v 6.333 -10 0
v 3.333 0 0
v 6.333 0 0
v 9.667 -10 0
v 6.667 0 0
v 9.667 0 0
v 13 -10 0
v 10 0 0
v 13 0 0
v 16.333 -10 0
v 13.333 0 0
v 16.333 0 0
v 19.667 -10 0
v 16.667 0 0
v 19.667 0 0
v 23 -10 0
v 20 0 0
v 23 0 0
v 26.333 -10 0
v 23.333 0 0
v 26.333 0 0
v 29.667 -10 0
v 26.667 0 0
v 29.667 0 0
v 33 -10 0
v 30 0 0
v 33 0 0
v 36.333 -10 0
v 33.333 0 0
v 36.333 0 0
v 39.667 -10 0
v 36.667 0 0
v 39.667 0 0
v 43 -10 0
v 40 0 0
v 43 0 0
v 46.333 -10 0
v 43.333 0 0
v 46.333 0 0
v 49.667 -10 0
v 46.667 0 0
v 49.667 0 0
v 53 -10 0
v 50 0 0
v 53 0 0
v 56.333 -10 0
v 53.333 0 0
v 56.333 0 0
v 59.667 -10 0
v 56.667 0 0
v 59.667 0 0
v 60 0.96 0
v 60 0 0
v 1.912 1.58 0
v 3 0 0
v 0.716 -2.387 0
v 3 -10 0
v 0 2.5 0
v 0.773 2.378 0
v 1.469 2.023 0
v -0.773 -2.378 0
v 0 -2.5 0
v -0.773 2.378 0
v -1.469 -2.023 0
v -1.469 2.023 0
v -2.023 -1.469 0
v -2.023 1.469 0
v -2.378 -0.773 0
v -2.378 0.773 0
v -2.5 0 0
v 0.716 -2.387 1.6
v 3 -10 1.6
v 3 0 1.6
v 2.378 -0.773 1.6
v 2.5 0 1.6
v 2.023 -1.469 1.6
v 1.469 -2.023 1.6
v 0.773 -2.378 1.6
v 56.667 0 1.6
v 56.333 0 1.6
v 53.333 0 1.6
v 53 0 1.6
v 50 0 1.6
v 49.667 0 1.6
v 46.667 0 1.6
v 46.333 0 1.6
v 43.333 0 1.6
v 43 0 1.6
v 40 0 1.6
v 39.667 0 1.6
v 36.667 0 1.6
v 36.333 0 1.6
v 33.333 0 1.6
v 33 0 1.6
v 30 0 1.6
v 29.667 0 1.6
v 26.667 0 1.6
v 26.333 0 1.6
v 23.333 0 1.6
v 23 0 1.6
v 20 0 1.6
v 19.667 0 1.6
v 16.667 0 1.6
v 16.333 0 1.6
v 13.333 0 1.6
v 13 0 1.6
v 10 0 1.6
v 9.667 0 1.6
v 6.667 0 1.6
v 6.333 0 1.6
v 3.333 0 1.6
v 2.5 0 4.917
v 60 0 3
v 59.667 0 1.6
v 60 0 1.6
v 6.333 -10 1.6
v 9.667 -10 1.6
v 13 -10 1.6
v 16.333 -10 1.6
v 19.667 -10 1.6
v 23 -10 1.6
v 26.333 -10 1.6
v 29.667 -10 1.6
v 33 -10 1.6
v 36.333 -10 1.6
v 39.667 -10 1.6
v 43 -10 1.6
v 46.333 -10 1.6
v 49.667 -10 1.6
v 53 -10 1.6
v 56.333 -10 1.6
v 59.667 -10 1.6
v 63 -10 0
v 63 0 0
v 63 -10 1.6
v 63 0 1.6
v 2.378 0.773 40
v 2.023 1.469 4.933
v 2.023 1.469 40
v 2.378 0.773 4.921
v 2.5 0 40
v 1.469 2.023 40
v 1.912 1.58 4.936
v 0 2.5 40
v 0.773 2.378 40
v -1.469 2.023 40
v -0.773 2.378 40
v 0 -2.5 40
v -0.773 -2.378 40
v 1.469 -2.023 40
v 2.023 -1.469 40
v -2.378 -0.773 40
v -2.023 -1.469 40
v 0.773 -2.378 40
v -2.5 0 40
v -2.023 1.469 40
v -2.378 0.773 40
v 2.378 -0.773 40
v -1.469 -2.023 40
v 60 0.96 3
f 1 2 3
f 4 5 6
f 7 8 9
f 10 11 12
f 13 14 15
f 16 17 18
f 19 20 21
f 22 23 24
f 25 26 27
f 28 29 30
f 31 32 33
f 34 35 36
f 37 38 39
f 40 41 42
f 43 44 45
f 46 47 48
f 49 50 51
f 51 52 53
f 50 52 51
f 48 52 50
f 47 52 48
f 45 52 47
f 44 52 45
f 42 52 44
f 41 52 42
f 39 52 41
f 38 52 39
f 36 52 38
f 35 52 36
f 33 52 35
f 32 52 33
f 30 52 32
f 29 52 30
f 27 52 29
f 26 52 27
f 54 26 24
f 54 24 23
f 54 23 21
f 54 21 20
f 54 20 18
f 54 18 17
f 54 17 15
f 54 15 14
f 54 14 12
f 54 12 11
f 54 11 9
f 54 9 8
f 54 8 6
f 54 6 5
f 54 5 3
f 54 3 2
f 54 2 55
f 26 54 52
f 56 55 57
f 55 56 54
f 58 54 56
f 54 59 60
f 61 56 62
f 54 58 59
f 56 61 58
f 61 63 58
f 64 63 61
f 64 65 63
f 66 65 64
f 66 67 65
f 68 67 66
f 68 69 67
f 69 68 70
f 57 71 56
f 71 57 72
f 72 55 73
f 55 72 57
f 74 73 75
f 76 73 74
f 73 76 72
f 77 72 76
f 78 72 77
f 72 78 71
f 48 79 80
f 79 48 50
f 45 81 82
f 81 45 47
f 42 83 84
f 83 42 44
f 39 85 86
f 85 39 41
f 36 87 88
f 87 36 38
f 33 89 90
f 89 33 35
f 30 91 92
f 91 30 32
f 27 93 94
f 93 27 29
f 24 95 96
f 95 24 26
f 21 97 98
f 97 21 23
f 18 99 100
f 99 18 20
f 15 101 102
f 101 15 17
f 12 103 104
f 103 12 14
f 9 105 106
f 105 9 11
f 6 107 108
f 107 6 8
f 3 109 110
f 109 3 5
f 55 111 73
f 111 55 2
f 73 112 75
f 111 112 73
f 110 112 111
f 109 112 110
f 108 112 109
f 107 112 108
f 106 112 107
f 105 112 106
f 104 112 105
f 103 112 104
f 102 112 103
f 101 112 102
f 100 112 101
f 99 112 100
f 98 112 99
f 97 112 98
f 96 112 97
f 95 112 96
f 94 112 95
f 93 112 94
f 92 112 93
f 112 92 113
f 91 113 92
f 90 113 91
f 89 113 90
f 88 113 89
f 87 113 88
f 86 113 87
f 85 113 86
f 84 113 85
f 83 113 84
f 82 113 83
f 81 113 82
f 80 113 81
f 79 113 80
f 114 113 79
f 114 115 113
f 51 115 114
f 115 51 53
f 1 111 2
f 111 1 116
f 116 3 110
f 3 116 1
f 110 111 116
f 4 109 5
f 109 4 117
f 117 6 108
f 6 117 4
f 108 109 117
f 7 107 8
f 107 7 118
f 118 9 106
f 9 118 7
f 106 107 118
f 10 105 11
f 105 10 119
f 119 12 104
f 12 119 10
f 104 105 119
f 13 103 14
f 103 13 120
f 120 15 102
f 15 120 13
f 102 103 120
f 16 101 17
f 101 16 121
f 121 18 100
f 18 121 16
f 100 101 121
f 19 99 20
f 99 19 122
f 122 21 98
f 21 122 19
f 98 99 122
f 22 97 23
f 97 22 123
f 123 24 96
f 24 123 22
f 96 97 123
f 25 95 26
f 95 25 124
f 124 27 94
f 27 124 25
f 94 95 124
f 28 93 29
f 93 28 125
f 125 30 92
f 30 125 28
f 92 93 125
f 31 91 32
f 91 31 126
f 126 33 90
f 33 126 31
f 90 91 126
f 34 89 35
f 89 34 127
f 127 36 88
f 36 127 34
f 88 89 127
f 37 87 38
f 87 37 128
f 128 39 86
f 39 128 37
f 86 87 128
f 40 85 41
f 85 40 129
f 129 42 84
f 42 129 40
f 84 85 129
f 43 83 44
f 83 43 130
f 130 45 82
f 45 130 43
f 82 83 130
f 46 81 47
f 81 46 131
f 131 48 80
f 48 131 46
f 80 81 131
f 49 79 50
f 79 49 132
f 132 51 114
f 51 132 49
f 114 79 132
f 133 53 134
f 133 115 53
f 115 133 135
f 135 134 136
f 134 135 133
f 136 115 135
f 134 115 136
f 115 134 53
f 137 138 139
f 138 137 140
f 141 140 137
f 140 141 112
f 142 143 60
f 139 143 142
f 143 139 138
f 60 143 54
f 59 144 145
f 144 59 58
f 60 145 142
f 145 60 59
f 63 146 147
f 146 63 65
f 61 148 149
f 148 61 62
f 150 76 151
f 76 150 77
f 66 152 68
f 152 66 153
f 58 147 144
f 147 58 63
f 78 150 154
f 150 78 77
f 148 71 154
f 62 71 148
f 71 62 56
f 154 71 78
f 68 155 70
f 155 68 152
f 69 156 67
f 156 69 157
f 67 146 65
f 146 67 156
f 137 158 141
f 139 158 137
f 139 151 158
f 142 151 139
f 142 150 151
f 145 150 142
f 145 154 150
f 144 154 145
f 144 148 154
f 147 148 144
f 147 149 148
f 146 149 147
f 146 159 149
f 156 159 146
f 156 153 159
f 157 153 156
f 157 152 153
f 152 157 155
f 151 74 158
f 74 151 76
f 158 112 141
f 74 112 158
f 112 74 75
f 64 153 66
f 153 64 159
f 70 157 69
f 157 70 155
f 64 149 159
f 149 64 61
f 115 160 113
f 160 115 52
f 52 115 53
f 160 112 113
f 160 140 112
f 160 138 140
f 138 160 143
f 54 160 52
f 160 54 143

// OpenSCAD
r=60;
h_hold=40;
h=5;
r_hold=5;
w=1.6;
num_comb=18;
h_comb=10;
w_comb=3;

union(){
    cylinder(r=r_hold/2,h=h_hold,$fn=20);
//    cube([r,w,h]);
    rotate([90,0,90])linear_extrude(r,scale=0.6)
        square([w,h],false);
    
    for(i=[0:r/(num_comb):r]) 
        translate([i,0,0])
            linear_extrude(w)polygon([[0,0],[w_comb,-h_comb],[w_comb,0]]);
        
}
